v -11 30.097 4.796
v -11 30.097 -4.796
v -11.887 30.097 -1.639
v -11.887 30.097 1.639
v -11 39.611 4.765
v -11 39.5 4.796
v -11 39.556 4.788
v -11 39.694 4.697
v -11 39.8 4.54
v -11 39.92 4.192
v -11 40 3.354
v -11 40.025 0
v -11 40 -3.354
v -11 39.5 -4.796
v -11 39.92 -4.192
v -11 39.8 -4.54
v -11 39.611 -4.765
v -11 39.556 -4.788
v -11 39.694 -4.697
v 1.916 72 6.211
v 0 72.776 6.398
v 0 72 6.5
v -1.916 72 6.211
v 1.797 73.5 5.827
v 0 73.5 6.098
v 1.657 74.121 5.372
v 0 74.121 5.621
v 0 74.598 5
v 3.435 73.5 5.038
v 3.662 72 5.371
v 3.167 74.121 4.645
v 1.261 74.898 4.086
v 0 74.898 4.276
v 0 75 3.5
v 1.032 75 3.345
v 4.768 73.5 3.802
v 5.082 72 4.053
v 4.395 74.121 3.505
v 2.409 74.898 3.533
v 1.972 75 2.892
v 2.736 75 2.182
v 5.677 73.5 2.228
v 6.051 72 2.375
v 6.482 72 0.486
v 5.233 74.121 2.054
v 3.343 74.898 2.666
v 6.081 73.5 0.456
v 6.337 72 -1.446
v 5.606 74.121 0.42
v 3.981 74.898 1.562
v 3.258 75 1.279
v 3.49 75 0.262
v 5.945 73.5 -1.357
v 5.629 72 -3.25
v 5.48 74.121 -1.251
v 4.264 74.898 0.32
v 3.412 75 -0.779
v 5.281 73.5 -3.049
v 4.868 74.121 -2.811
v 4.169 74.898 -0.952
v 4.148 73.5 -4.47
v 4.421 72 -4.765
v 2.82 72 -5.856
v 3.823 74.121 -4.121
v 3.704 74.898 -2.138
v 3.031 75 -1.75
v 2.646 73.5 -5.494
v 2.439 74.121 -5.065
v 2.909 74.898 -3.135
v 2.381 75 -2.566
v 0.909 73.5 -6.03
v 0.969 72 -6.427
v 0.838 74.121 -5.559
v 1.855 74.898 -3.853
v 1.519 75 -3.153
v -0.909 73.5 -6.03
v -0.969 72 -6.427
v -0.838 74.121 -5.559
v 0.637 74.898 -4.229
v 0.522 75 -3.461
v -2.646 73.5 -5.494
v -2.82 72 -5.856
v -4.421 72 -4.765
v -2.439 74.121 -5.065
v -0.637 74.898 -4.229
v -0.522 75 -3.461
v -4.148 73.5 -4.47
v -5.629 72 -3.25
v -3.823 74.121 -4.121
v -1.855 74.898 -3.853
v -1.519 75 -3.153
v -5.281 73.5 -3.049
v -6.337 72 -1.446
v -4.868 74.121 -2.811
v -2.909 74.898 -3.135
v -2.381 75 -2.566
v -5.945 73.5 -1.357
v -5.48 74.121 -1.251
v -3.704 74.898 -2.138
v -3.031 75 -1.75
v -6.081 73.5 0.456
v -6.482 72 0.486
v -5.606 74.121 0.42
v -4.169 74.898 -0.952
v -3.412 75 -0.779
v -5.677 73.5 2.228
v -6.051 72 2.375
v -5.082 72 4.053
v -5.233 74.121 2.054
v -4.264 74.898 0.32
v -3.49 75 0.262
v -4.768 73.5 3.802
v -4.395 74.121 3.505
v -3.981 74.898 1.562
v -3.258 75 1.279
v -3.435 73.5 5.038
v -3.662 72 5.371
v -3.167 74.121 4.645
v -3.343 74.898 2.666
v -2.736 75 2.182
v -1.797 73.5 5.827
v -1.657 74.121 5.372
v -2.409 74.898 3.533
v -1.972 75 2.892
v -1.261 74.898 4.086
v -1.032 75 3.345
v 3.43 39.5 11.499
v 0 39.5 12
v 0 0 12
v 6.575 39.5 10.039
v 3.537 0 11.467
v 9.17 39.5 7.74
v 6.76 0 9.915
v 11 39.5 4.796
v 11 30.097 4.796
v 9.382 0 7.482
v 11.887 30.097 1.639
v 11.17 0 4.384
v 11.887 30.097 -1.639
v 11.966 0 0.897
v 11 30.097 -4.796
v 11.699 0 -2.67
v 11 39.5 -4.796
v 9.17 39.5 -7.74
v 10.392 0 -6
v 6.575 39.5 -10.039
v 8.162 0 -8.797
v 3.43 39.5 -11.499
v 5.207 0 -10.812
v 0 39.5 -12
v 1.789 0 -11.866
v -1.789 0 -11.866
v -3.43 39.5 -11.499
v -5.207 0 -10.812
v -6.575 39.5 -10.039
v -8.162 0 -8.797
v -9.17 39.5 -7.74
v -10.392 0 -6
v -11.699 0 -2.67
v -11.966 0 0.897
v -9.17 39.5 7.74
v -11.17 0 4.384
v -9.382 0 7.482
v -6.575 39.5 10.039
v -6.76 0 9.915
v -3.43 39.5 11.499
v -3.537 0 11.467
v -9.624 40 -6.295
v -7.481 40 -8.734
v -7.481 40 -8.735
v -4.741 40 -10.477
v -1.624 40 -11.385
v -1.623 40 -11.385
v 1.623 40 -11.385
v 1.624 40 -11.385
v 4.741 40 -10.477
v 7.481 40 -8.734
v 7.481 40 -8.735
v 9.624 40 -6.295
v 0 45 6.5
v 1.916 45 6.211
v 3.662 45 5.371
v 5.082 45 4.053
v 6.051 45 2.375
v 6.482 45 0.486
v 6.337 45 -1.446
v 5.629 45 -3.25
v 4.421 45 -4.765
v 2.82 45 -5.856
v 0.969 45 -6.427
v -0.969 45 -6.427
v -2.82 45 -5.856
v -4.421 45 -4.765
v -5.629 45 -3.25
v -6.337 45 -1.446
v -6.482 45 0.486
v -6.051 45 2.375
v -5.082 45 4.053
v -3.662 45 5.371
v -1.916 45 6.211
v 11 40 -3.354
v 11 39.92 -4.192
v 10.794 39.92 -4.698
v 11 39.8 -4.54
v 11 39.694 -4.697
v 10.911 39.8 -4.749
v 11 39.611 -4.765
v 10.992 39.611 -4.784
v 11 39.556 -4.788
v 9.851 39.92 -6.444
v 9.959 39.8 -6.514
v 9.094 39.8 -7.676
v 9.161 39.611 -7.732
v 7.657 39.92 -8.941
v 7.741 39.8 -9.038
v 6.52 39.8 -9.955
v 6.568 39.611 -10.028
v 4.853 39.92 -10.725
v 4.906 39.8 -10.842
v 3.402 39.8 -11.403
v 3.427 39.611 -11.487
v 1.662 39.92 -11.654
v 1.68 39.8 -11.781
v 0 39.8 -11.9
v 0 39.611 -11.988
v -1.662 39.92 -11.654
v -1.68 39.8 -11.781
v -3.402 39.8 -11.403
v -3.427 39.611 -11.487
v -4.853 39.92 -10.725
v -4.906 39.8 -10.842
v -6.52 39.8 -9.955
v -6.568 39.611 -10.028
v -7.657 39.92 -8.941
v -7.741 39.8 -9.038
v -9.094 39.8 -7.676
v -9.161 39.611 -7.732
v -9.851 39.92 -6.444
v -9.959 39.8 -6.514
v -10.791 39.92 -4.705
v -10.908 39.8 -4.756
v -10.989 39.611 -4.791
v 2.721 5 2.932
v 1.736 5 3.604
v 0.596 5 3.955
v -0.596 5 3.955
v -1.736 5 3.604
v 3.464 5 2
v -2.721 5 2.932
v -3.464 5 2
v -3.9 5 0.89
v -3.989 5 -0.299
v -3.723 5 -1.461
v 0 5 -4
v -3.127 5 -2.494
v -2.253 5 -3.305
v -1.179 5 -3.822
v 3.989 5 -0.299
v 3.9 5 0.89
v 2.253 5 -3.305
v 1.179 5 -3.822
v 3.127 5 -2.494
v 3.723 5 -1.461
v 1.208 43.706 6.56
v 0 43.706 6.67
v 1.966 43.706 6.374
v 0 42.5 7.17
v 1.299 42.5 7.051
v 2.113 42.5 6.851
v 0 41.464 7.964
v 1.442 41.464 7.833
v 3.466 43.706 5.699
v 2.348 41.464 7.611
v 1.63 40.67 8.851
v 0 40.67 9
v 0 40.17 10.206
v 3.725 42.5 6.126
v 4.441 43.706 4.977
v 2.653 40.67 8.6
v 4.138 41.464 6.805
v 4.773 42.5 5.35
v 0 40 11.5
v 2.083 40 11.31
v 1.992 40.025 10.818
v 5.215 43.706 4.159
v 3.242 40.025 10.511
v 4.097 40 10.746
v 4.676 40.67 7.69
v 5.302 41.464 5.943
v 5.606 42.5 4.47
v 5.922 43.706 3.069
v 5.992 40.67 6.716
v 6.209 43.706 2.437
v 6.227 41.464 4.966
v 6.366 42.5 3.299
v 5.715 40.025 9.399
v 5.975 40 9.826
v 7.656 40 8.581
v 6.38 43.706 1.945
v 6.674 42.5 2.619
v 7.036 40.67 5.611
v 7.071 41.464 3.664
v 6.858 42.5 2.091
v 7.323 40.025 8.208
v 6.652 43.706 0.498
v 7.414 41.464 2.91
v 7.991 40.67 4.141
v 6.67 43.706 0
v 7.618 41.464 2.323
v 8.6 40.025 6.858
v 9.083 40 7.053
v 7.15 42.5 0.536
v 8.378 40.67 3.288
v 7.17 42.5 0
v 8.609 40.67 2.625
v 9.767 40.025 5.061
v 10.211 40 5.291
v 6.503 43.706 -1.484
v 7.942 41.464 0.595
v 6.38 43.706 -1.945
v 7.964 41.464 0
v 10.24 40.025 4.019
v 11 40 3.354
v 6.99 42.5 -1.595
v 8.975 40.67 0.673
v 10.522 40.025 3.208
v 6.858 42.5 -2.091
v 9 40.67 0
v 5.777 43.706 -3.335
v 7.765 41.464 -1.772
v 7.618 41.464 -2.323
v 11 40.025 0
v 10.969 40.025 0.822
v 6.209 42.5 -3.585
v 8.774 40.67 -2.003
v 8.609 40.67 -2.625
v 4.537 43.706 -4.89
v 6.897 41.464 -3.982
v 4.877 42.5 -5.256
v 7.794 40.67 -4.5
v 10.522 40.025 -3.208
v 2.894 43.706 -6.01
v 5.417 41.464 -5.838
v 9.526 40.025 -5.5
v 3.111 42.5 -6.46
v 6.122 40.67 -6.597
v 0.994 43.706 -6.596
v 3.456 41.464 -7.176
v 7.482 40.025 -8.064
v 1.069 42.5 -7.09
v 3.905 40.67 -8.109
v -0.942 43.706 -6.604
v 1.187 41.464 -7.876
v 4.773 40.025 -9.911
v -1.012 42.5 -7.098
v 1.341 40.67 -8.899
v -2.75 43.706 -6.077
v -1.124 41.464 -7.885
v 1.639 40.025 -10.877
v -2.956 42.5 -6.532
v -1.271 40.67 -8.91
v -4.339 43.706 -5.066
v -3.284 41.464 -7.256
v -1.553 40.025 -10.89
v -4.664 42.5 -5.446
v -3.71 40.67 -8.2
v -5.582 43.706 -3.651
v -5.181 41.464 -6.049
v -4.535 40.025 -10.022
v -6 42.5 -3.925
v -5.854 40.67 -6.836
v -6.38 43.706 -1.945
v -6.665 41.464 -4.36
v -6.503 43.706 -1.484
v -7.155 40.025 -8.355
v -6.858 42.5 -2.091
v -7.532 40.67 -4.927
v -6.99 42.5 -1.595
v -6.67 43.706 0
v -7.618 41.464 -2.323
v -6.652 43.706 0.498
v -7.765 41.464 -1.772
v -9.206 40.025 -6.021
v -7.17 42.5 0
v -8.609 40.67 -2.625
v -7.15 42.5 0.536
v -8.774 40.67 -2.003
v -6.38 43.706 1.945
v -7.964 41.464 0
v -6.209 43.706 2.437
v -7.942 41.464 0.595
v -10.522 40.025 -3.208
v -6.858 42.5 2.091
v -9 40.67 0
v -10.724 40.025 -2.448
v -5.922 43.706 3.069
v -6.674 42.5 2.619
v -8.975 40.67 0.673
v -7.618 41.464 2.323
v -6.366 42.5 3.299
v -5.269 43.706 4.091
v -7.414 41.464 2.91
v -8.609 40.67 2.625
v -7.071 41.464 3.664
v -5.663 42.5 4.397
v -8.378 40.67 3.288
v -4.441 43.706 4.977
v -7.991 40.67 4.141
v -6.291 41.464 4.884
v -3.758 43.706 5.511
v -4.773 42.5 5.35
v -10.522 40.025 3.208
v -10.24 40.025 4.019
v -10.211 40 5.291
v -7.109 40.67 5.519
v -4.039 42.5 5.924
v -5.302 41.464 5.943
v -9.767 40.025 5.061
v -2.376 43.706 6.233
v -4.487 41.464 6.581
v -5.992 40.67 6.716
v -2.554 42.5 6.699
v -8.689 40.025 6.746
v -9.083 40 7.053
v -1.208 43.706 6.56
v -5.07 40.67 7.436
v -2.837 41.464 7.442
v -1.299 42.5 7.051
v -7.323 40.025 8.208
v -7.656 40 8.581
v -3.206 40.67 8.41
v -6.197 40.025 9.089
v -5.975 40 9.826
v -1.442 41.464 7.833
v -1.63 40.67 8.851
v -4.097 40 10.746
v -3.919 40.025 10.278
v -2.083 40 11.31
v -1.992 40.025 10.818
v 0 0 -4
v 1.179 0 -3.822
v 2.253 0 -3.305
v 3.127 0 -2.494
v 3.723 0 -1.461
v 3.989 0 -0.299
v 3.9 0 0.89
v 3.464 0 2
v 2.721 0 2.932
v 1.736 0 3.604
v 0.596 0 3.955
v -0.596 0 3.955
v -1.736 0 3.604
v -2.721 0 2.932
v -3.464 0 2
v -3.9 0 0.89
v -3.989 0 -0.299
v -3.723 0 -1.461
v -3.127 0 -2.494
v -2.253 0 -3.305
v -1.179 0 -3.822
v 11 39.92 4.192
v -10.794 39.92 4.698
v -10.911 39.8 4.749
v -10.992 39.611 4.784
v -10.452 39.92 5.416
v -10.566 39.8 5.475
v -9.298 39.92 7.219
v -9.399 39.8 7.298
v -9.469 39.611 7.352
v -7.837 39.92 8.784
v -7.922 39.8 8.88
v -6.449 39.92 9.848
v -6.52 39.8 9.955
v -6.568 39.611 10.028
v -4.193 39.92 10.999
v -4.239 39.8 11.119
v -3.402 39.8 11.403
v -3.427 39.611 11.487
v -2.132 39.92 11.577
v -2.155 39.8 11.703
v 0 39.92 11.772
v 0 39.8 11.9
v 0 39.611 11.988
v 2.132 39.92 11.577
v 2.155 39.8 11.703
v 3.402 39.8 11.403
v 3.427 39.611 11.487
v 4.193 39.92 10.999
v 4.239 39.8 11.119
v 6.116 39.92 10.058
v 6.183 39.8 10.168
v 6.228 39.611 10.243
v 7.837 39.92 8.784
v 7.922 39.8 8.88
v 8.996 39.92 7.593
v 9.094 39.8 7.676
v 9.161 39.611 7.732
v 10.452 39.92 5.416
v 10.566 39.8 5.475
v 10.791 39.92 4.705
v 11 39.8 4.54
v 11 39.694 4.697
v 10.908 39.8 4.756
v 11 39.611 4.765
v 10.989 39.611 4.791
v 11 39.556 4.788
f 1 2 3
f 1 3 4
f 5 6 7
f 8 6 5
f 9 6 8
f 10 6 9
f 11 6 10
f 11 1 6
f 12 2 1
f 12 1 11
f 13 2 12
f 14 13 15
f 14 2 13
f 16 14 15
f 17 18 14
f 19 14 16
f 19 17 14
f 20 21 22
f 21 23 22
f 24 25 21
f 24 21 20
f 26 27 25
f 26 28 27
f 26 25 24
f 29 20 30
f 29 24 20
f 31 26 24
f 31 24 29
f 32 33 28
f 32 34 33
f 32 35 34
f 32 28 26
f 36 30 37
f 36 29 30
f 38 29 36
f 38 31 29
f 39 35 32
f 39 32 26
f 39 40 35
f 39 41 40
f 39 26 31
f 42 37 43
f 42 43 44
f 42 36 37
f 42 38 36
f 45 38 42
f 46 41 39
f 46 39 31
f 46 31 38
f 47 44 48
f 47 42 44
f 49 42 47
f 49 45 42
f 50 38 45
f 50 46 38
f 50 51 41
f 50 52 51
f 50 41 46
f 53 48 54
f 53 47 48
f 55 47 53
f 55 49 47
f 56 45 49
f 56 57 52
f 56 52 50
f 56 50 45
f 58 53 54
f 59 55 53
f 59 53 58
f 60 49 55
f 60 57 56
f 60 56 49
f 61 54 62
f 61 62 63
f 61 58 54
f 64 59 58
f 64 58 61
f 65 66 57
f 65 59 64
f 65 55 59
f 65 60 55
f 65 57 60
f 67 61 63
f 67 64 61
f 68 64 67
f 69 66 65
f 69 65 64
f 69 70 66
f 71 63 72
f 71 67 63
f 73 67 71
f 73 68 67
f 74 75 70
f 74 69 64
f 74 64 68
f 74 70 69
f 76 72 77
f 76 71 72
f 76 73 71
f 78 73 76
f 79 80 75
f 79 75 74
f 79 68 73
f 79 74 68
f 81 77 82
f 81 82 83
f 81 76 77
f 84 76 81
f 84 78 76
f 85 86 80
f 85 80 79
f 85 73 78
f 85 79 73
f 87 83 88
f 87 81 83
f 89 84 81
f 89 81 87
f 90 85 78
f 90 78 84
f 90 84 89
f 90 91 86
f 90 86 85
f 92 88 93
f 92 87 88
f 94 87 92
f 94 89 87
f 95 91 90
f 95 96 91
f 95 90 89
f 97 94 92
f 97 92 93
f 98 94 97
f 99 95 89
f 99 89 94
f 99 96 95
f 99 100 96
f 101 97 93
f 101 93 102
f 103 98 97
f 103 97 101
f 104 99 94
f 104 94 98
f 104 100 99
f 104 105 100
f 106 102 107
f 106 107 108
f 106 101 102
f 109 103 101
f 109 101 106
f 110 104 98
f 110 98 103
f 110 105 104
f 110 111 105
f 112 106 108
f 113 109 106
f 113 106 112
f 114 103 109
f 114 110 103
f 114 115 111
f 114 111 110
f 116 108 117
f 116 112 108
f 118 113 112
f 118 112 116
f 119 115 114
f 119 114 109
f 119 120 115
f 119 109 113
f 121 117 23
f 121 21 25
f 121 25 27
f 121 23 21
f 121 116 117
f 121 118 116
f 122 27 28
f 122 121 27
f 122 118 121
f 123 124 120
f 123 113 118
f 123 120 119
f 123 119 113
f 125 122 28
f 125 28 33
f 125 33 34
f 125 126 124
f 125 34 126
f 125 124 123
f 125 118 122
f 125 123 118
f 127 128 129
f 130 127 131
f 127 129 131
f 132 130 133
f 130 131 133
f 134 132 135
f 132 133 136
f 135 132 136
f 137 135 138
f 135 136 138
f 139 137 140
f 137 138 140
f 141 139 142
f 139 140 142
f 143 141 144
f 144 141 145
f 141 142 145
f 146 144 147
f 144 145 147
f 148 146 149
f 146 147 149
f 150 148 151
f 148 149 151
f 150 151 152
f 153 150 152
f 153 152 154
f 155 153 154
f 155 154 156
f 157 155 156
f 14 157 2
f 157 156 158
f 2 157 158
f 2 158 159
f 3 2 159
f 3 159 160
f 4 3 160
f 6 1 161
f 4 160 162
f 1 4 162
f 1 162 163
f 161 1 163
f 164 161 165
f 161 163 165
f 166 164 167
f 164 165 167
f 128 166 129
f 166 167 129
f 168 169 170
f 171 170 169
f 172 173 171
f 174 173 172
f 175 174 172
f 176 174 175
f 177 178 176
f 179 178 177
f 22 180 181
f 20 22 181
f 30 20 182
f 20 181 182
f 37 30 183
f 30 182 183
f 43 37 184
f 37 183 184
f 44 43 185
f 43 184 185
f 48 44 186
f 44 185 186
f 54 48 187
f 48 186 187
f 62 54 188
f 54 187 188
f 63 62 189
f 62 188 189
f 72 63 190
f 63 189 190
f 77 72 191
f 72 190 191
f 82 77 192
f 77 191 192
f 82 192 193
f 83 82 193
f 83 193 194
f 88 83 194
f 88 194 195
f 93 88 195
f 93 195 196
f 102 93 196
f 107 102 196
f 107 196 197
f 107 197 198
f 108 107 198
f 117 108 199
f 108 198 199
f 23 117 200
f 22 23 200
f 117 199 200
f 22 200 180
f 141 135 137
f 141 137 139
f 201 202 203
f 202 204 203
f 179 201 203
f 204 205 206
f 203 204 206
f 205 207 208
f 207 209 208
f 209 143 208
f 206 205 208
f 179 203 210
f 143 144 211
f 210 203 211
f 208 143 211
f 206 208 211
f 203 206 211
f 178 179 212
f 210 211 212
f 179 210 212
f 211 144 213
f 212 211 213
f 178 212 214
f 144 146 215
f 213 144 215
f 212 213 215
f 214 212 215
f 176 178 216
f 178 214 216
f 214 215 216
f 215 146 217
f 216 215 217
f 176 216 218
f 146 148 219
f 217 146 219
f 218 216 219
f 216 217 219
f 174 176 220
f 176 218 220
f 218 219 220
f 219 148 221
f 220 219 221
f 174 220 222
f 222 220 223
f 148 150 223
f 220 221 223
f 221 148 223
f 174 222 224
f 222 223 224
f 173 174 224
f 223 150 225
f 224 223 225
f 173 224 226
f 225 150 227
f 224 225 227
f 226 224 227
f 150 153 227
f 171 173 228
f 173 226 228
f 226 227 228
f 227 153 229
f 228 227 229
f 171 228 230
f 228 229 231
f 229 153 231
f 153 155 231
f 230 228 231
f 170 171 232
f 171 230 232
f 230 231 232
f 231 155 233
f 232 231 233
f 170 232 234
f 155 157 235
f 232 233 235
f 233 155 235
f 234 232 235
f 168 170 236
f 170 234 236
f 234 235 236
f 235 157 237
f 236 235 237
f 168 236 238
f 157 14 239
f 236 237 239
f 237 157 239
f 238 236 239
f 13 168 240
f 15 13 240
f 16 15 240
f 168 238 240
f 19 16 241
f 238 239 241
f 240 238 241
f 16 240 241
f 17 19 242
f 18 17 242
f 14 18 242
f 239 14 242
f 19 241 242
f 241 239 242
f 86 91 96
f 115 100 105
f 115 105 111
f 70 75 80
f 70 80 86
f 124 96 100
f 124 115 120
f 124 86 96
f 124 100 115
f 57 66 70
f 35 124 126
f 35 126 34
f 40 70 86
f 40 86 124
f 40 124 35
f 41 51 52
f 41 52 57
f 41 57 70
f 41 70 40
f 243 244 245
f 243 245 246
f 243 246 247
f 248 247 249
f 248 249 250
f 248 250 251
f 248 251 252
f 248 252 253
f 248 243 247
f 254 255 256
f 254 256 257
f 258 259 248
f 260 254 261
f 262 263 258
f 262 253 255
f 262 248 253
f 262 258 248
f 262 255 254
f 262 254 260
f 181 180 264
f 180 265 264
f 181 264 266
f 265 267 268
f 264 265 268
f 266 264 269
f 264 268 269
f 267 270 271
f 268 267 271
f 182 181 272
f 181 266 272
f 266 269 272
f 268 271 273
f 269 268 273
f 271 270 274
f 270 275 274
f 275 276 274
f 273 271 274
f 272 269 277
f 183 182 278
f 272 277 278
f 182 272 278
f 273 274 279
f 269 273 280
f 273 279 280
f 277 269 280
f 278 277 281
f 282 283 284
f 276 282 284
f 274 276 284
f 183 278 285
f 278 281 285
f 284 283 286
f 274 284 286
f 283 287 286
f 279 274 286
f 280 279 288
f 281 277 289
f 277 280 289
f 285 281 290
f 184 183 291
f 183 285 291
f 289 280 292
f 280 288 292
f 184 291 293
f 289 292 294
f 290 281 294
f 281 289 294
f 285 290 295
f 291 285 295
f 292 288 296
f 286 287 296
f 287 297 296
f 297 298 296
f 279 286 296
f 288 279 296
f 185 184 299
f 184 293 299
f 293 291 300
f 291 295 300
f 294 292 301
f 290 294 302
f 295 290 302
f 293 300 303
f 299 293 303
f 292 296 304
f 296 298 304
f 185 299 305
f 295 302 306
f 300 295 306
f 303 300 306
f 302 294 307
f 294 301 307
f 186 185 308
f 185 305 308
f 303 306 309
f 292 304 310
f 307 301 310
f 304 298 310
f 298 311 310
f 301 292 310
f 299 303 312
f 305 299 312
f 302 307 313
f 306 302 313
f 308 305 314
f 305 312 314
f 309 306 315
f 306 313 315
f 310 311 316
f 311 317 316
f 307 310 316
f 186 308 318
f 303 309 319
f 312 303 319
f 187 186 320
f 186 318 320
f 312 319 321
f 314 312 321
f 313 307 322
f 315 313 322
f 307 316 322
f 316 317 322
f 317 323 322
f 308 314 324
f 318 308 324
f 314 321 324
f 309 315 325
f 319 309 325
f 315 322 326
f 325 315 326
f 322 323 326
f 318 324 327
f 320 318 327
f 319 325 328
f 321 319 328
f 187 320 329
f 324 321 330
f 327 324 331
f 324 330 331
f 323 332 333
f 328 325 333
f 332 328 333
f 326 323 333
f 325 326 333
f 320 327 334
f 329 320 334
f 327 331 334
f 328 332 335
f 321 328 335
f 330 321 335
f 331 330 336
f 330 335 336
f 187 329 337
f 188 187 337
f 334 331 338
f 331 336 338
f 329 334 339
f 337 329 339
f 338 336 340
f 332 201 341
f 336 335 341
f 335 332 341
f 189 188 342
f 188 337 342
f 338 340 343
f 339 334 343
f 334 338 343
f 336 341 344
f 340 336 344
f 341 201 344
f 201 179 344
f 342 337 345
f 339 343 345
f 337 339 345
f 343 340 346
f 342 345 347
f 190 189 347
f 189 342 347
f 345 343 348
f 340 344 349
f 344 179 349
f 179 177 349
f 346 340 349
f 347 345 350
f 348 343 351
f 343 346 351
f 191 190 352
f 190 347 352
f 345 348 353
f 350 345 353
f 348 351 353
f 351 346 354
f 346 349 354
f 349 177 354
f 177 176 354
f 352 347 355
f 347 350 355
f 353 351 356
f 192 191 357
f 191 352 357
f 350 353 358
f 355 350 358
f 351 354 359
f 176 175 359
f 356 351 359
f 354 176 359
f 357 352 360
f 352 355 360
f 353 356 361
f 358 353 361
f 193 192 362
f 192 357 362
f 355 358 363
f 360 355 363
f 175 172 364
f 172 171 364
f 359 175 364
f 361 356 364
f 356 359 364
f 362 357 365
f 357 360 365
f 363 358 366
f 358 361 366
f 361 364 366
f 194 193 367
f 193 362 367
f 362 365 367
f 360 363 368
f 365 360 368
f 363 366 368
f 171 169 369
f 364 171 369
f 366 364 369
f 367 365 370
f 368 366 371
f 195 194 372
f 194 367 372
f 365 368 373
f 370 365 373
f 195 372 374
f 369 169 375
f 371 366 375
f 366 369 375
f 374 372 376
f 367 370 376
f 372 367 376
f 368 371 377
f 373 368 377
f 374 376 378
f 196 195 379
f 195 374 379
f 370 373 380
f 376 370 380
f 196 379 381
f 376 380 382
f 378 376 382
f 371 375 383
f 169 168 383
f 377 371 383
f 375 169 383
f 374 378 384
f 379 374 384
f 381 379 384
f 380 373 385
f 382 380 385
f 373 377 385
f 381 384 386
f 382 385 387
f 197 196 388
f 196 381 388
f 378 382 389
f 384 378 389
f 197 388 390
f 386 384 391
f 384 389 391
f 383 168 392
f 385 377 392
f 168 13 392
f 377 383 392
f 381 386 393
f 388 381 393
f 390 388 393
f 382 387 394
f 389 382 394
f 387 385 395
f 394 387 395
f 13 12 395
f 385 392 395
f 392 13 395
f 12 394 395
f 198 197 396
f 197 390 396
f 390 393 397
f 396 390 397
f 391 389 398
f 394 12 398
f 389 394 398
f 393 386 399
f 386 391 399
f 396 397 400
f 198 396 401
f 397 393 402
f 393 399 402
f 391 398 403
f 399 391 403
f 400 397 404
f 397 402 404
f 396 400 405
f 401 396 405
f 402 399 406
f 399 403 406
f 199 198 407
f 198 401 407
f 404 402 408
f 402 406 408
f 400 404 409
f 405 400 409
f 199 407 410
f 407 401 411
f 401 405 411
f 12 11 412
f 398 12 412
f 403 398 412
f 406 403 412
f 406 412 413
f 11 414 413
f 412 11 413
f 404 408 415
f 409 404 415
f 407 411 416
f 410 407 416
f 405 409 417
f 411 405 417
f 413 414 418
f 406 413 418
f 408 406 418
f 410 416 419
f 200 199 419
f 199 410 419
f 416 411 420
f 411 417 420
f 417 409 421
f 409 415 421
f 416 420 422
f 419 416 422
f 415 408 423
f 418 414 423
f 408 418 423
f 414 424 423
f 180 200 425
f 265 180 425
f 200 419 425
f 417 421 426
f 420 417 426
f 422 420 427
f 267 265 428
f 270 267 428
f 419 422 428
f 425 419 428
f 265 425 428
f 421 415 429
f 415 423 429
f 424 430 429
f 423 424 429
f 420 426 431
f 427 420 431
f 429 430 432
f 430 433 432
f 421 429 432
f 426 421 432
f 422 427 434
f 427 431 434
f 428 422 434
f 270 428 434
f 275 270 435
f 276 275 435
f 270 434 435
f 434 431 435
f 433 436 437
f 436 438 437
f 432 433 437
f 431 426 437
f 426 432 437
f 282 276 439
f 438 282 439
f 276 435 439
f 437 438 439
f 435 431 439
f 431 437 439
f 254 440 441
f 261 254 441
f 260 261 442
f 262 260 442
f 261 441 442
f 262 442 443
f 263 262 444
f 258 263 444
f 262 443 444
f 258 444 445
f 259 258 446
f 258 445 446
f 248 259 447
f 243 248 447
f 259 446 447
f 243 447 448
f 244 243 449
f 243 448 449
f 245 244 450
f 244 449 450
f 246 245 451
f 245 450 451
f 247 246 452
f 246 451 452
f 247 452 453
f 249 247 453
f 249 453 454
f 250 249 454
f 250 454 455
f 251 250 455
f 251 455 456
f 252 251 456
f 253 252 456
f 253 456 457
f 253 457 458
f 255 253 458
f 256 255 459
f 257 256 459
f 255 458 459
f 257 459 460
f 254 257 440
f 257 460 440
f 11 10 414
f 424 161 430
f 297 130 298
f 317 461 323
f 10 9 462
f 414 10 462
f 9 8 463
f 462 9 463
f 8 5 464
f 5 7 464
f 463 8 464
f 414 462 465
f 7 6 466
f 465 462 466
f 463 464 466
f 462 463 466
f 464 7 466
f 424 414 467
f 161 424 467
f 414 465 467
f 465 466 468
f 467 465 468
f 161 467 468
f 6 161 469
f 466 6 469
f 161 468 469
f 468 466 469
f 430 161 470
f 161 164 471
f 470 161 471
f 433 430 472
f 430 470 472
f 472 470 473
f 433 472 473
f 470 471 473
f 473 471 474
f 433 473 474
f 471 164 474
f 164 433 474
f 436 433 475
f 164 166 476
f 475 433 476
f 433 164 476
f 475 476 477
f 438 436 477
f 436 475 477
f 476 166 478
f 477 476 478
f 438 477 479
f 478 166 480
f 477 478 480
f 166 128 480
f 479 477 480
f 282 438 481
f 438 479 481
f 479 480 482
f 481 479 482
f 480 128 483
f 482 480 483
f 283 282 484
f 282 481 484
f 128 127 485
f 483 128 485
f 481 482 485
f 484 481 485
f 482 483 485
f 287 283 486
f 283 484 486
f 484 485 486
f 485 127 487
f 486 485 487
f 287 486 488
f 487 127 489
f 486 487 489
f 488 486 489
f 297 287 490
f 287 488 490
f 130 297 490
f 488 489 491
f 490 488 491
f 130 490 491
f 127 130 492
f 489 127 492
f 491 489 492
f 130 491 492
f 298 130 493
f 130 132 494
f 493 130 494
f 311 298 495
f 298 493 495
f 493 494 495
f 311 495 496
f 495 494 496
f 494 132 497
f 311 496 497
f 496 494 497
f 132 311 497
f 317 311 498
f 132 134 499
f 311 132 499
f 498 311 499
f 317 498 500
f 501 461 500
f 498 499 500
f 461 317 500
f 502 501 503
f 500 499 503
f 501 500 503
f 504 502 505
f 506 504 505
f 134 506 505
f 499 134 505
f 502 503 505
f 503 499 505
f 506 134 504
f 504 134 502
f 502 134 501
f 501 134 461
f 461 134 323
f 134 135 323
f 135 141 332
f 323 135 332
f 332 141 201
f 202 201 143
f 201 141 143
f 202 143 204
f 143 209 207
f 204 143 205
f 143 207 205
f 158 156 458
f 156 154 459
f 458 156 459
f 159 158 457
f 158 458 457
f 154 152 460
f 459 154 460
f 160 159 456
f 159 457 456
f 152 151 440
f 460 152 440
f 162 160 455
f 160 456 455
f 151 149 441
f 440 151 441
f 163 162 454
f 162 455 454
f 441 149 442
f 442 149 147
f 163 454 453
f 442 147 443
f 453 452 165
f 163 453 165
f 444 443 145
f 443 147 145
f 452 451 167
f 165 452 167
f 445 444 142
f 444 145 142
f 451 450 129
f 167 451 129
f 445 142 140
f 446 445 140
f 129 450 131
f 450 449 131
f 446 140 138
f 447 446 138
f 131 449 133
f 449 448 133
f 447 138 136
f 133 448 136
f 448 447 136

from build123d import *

# Parameters (mm, degrees)
SKETCH1_R               = 12
BOSS_EXTRUDE1_DEPTH     = 40
SKETCH2_R               = 6.5
BOSS_EXTRUDE2_DEPTH     = 35
FILLET1_R               = 3
FILLET2_R               = 5
FILLET3_R               = 0.5
CUT_EXTRUDE1_DEPTH      = 77.896033821
CUT_EXTRUDE1_DEPTH_BACK = 77.896033821
SKETCH3_W               = 1
SKETCH3_H               = 10
SKETCH4_R               = 4
CUT_EXTRUDE2_DEPTH      = 5


with BuildPart() as part:
    # Sketch1 → Boss-Extrude1 (new body)
    with BuildSketch(Plane(origin=(0, 0, 0), x_dir=(1, 0, 0), z_dir=(0, 1, 0))):
        with Locations(Location((0, 0, 0), (0, 0, 270))):
            Circle(SKETCH1_R)
    extrude(amount=BOSS_EXTRUDE1_DEPTH)

    # Sketch2 → Boss-Extrude2 (add)
    with BuildSketch(Plane(origin=(0, 40, 0), x_dir=(1, 0, 0), z_dir=(0, 1, 0))):
        with Locations(Location((0, 0, 0), (0, 0, 270))):
            Circle(SKETCH2_R)
    extrude(amount=BOSS_EXTRUDE2_DEPTH)

    # Fillet1
    fillet1_edges = [part.edges().sort_by_distance(p)[0] for p in [
        (0, 75, -6.5),
    ]]
    fillet(fillet1_edges, radius=FILLET1_R)

    # Fillet2
    fillet2_edges = [part.edges().sort_by_distance(p)[0] for p in [
        (0, 40, -6.5),
    ]]
    fillet(fillet2_edges, radius=FILLET2_R)

    # Fillet3
    fillet3_edges = [part.edges().sort_by_distance(p)[0] for p in [
        (0, 40, -12),
    ]]
    fillet(fillet3_edges, radius=FILLET3_R - 0.0001)  # a hair under: the kernel refuses the full size

    # Sketch3 → Cut-Extrude1 (cut, two sides: drawn at the far end of the back side and taken through both)
    with BuildSketch(Plane.XY.offset(-CUT_EXTRUDE1_DEPTH_BACK)):
        with Locations((-11.5, 35.09742525)):
            Rectangle(SKETCH3_W, SKETCH3_H)
        with Locations((11.5, 35.09742525)):
            Rectangle(SKETCH3_W, SKETCH3_H)
    extrude(amount=CUT_EXTRUDE1_DEPTH + CUT_EXTRUDE1_DEPTH_BACK, mode=Mode.SUBTRACT)

    # Sketch4 → Cut-Extrude2 (cut)
    with BuildSketch(Plane.XZ):
        with Locations(Location((0, 0, 0), (0, 0, 270))):
            Circle(SKETCH4_R)
    extrude(amount=-CUT_EXTRUDE2_DEPTH, mode=Mode.SUBTRACT)


solid = part.part
